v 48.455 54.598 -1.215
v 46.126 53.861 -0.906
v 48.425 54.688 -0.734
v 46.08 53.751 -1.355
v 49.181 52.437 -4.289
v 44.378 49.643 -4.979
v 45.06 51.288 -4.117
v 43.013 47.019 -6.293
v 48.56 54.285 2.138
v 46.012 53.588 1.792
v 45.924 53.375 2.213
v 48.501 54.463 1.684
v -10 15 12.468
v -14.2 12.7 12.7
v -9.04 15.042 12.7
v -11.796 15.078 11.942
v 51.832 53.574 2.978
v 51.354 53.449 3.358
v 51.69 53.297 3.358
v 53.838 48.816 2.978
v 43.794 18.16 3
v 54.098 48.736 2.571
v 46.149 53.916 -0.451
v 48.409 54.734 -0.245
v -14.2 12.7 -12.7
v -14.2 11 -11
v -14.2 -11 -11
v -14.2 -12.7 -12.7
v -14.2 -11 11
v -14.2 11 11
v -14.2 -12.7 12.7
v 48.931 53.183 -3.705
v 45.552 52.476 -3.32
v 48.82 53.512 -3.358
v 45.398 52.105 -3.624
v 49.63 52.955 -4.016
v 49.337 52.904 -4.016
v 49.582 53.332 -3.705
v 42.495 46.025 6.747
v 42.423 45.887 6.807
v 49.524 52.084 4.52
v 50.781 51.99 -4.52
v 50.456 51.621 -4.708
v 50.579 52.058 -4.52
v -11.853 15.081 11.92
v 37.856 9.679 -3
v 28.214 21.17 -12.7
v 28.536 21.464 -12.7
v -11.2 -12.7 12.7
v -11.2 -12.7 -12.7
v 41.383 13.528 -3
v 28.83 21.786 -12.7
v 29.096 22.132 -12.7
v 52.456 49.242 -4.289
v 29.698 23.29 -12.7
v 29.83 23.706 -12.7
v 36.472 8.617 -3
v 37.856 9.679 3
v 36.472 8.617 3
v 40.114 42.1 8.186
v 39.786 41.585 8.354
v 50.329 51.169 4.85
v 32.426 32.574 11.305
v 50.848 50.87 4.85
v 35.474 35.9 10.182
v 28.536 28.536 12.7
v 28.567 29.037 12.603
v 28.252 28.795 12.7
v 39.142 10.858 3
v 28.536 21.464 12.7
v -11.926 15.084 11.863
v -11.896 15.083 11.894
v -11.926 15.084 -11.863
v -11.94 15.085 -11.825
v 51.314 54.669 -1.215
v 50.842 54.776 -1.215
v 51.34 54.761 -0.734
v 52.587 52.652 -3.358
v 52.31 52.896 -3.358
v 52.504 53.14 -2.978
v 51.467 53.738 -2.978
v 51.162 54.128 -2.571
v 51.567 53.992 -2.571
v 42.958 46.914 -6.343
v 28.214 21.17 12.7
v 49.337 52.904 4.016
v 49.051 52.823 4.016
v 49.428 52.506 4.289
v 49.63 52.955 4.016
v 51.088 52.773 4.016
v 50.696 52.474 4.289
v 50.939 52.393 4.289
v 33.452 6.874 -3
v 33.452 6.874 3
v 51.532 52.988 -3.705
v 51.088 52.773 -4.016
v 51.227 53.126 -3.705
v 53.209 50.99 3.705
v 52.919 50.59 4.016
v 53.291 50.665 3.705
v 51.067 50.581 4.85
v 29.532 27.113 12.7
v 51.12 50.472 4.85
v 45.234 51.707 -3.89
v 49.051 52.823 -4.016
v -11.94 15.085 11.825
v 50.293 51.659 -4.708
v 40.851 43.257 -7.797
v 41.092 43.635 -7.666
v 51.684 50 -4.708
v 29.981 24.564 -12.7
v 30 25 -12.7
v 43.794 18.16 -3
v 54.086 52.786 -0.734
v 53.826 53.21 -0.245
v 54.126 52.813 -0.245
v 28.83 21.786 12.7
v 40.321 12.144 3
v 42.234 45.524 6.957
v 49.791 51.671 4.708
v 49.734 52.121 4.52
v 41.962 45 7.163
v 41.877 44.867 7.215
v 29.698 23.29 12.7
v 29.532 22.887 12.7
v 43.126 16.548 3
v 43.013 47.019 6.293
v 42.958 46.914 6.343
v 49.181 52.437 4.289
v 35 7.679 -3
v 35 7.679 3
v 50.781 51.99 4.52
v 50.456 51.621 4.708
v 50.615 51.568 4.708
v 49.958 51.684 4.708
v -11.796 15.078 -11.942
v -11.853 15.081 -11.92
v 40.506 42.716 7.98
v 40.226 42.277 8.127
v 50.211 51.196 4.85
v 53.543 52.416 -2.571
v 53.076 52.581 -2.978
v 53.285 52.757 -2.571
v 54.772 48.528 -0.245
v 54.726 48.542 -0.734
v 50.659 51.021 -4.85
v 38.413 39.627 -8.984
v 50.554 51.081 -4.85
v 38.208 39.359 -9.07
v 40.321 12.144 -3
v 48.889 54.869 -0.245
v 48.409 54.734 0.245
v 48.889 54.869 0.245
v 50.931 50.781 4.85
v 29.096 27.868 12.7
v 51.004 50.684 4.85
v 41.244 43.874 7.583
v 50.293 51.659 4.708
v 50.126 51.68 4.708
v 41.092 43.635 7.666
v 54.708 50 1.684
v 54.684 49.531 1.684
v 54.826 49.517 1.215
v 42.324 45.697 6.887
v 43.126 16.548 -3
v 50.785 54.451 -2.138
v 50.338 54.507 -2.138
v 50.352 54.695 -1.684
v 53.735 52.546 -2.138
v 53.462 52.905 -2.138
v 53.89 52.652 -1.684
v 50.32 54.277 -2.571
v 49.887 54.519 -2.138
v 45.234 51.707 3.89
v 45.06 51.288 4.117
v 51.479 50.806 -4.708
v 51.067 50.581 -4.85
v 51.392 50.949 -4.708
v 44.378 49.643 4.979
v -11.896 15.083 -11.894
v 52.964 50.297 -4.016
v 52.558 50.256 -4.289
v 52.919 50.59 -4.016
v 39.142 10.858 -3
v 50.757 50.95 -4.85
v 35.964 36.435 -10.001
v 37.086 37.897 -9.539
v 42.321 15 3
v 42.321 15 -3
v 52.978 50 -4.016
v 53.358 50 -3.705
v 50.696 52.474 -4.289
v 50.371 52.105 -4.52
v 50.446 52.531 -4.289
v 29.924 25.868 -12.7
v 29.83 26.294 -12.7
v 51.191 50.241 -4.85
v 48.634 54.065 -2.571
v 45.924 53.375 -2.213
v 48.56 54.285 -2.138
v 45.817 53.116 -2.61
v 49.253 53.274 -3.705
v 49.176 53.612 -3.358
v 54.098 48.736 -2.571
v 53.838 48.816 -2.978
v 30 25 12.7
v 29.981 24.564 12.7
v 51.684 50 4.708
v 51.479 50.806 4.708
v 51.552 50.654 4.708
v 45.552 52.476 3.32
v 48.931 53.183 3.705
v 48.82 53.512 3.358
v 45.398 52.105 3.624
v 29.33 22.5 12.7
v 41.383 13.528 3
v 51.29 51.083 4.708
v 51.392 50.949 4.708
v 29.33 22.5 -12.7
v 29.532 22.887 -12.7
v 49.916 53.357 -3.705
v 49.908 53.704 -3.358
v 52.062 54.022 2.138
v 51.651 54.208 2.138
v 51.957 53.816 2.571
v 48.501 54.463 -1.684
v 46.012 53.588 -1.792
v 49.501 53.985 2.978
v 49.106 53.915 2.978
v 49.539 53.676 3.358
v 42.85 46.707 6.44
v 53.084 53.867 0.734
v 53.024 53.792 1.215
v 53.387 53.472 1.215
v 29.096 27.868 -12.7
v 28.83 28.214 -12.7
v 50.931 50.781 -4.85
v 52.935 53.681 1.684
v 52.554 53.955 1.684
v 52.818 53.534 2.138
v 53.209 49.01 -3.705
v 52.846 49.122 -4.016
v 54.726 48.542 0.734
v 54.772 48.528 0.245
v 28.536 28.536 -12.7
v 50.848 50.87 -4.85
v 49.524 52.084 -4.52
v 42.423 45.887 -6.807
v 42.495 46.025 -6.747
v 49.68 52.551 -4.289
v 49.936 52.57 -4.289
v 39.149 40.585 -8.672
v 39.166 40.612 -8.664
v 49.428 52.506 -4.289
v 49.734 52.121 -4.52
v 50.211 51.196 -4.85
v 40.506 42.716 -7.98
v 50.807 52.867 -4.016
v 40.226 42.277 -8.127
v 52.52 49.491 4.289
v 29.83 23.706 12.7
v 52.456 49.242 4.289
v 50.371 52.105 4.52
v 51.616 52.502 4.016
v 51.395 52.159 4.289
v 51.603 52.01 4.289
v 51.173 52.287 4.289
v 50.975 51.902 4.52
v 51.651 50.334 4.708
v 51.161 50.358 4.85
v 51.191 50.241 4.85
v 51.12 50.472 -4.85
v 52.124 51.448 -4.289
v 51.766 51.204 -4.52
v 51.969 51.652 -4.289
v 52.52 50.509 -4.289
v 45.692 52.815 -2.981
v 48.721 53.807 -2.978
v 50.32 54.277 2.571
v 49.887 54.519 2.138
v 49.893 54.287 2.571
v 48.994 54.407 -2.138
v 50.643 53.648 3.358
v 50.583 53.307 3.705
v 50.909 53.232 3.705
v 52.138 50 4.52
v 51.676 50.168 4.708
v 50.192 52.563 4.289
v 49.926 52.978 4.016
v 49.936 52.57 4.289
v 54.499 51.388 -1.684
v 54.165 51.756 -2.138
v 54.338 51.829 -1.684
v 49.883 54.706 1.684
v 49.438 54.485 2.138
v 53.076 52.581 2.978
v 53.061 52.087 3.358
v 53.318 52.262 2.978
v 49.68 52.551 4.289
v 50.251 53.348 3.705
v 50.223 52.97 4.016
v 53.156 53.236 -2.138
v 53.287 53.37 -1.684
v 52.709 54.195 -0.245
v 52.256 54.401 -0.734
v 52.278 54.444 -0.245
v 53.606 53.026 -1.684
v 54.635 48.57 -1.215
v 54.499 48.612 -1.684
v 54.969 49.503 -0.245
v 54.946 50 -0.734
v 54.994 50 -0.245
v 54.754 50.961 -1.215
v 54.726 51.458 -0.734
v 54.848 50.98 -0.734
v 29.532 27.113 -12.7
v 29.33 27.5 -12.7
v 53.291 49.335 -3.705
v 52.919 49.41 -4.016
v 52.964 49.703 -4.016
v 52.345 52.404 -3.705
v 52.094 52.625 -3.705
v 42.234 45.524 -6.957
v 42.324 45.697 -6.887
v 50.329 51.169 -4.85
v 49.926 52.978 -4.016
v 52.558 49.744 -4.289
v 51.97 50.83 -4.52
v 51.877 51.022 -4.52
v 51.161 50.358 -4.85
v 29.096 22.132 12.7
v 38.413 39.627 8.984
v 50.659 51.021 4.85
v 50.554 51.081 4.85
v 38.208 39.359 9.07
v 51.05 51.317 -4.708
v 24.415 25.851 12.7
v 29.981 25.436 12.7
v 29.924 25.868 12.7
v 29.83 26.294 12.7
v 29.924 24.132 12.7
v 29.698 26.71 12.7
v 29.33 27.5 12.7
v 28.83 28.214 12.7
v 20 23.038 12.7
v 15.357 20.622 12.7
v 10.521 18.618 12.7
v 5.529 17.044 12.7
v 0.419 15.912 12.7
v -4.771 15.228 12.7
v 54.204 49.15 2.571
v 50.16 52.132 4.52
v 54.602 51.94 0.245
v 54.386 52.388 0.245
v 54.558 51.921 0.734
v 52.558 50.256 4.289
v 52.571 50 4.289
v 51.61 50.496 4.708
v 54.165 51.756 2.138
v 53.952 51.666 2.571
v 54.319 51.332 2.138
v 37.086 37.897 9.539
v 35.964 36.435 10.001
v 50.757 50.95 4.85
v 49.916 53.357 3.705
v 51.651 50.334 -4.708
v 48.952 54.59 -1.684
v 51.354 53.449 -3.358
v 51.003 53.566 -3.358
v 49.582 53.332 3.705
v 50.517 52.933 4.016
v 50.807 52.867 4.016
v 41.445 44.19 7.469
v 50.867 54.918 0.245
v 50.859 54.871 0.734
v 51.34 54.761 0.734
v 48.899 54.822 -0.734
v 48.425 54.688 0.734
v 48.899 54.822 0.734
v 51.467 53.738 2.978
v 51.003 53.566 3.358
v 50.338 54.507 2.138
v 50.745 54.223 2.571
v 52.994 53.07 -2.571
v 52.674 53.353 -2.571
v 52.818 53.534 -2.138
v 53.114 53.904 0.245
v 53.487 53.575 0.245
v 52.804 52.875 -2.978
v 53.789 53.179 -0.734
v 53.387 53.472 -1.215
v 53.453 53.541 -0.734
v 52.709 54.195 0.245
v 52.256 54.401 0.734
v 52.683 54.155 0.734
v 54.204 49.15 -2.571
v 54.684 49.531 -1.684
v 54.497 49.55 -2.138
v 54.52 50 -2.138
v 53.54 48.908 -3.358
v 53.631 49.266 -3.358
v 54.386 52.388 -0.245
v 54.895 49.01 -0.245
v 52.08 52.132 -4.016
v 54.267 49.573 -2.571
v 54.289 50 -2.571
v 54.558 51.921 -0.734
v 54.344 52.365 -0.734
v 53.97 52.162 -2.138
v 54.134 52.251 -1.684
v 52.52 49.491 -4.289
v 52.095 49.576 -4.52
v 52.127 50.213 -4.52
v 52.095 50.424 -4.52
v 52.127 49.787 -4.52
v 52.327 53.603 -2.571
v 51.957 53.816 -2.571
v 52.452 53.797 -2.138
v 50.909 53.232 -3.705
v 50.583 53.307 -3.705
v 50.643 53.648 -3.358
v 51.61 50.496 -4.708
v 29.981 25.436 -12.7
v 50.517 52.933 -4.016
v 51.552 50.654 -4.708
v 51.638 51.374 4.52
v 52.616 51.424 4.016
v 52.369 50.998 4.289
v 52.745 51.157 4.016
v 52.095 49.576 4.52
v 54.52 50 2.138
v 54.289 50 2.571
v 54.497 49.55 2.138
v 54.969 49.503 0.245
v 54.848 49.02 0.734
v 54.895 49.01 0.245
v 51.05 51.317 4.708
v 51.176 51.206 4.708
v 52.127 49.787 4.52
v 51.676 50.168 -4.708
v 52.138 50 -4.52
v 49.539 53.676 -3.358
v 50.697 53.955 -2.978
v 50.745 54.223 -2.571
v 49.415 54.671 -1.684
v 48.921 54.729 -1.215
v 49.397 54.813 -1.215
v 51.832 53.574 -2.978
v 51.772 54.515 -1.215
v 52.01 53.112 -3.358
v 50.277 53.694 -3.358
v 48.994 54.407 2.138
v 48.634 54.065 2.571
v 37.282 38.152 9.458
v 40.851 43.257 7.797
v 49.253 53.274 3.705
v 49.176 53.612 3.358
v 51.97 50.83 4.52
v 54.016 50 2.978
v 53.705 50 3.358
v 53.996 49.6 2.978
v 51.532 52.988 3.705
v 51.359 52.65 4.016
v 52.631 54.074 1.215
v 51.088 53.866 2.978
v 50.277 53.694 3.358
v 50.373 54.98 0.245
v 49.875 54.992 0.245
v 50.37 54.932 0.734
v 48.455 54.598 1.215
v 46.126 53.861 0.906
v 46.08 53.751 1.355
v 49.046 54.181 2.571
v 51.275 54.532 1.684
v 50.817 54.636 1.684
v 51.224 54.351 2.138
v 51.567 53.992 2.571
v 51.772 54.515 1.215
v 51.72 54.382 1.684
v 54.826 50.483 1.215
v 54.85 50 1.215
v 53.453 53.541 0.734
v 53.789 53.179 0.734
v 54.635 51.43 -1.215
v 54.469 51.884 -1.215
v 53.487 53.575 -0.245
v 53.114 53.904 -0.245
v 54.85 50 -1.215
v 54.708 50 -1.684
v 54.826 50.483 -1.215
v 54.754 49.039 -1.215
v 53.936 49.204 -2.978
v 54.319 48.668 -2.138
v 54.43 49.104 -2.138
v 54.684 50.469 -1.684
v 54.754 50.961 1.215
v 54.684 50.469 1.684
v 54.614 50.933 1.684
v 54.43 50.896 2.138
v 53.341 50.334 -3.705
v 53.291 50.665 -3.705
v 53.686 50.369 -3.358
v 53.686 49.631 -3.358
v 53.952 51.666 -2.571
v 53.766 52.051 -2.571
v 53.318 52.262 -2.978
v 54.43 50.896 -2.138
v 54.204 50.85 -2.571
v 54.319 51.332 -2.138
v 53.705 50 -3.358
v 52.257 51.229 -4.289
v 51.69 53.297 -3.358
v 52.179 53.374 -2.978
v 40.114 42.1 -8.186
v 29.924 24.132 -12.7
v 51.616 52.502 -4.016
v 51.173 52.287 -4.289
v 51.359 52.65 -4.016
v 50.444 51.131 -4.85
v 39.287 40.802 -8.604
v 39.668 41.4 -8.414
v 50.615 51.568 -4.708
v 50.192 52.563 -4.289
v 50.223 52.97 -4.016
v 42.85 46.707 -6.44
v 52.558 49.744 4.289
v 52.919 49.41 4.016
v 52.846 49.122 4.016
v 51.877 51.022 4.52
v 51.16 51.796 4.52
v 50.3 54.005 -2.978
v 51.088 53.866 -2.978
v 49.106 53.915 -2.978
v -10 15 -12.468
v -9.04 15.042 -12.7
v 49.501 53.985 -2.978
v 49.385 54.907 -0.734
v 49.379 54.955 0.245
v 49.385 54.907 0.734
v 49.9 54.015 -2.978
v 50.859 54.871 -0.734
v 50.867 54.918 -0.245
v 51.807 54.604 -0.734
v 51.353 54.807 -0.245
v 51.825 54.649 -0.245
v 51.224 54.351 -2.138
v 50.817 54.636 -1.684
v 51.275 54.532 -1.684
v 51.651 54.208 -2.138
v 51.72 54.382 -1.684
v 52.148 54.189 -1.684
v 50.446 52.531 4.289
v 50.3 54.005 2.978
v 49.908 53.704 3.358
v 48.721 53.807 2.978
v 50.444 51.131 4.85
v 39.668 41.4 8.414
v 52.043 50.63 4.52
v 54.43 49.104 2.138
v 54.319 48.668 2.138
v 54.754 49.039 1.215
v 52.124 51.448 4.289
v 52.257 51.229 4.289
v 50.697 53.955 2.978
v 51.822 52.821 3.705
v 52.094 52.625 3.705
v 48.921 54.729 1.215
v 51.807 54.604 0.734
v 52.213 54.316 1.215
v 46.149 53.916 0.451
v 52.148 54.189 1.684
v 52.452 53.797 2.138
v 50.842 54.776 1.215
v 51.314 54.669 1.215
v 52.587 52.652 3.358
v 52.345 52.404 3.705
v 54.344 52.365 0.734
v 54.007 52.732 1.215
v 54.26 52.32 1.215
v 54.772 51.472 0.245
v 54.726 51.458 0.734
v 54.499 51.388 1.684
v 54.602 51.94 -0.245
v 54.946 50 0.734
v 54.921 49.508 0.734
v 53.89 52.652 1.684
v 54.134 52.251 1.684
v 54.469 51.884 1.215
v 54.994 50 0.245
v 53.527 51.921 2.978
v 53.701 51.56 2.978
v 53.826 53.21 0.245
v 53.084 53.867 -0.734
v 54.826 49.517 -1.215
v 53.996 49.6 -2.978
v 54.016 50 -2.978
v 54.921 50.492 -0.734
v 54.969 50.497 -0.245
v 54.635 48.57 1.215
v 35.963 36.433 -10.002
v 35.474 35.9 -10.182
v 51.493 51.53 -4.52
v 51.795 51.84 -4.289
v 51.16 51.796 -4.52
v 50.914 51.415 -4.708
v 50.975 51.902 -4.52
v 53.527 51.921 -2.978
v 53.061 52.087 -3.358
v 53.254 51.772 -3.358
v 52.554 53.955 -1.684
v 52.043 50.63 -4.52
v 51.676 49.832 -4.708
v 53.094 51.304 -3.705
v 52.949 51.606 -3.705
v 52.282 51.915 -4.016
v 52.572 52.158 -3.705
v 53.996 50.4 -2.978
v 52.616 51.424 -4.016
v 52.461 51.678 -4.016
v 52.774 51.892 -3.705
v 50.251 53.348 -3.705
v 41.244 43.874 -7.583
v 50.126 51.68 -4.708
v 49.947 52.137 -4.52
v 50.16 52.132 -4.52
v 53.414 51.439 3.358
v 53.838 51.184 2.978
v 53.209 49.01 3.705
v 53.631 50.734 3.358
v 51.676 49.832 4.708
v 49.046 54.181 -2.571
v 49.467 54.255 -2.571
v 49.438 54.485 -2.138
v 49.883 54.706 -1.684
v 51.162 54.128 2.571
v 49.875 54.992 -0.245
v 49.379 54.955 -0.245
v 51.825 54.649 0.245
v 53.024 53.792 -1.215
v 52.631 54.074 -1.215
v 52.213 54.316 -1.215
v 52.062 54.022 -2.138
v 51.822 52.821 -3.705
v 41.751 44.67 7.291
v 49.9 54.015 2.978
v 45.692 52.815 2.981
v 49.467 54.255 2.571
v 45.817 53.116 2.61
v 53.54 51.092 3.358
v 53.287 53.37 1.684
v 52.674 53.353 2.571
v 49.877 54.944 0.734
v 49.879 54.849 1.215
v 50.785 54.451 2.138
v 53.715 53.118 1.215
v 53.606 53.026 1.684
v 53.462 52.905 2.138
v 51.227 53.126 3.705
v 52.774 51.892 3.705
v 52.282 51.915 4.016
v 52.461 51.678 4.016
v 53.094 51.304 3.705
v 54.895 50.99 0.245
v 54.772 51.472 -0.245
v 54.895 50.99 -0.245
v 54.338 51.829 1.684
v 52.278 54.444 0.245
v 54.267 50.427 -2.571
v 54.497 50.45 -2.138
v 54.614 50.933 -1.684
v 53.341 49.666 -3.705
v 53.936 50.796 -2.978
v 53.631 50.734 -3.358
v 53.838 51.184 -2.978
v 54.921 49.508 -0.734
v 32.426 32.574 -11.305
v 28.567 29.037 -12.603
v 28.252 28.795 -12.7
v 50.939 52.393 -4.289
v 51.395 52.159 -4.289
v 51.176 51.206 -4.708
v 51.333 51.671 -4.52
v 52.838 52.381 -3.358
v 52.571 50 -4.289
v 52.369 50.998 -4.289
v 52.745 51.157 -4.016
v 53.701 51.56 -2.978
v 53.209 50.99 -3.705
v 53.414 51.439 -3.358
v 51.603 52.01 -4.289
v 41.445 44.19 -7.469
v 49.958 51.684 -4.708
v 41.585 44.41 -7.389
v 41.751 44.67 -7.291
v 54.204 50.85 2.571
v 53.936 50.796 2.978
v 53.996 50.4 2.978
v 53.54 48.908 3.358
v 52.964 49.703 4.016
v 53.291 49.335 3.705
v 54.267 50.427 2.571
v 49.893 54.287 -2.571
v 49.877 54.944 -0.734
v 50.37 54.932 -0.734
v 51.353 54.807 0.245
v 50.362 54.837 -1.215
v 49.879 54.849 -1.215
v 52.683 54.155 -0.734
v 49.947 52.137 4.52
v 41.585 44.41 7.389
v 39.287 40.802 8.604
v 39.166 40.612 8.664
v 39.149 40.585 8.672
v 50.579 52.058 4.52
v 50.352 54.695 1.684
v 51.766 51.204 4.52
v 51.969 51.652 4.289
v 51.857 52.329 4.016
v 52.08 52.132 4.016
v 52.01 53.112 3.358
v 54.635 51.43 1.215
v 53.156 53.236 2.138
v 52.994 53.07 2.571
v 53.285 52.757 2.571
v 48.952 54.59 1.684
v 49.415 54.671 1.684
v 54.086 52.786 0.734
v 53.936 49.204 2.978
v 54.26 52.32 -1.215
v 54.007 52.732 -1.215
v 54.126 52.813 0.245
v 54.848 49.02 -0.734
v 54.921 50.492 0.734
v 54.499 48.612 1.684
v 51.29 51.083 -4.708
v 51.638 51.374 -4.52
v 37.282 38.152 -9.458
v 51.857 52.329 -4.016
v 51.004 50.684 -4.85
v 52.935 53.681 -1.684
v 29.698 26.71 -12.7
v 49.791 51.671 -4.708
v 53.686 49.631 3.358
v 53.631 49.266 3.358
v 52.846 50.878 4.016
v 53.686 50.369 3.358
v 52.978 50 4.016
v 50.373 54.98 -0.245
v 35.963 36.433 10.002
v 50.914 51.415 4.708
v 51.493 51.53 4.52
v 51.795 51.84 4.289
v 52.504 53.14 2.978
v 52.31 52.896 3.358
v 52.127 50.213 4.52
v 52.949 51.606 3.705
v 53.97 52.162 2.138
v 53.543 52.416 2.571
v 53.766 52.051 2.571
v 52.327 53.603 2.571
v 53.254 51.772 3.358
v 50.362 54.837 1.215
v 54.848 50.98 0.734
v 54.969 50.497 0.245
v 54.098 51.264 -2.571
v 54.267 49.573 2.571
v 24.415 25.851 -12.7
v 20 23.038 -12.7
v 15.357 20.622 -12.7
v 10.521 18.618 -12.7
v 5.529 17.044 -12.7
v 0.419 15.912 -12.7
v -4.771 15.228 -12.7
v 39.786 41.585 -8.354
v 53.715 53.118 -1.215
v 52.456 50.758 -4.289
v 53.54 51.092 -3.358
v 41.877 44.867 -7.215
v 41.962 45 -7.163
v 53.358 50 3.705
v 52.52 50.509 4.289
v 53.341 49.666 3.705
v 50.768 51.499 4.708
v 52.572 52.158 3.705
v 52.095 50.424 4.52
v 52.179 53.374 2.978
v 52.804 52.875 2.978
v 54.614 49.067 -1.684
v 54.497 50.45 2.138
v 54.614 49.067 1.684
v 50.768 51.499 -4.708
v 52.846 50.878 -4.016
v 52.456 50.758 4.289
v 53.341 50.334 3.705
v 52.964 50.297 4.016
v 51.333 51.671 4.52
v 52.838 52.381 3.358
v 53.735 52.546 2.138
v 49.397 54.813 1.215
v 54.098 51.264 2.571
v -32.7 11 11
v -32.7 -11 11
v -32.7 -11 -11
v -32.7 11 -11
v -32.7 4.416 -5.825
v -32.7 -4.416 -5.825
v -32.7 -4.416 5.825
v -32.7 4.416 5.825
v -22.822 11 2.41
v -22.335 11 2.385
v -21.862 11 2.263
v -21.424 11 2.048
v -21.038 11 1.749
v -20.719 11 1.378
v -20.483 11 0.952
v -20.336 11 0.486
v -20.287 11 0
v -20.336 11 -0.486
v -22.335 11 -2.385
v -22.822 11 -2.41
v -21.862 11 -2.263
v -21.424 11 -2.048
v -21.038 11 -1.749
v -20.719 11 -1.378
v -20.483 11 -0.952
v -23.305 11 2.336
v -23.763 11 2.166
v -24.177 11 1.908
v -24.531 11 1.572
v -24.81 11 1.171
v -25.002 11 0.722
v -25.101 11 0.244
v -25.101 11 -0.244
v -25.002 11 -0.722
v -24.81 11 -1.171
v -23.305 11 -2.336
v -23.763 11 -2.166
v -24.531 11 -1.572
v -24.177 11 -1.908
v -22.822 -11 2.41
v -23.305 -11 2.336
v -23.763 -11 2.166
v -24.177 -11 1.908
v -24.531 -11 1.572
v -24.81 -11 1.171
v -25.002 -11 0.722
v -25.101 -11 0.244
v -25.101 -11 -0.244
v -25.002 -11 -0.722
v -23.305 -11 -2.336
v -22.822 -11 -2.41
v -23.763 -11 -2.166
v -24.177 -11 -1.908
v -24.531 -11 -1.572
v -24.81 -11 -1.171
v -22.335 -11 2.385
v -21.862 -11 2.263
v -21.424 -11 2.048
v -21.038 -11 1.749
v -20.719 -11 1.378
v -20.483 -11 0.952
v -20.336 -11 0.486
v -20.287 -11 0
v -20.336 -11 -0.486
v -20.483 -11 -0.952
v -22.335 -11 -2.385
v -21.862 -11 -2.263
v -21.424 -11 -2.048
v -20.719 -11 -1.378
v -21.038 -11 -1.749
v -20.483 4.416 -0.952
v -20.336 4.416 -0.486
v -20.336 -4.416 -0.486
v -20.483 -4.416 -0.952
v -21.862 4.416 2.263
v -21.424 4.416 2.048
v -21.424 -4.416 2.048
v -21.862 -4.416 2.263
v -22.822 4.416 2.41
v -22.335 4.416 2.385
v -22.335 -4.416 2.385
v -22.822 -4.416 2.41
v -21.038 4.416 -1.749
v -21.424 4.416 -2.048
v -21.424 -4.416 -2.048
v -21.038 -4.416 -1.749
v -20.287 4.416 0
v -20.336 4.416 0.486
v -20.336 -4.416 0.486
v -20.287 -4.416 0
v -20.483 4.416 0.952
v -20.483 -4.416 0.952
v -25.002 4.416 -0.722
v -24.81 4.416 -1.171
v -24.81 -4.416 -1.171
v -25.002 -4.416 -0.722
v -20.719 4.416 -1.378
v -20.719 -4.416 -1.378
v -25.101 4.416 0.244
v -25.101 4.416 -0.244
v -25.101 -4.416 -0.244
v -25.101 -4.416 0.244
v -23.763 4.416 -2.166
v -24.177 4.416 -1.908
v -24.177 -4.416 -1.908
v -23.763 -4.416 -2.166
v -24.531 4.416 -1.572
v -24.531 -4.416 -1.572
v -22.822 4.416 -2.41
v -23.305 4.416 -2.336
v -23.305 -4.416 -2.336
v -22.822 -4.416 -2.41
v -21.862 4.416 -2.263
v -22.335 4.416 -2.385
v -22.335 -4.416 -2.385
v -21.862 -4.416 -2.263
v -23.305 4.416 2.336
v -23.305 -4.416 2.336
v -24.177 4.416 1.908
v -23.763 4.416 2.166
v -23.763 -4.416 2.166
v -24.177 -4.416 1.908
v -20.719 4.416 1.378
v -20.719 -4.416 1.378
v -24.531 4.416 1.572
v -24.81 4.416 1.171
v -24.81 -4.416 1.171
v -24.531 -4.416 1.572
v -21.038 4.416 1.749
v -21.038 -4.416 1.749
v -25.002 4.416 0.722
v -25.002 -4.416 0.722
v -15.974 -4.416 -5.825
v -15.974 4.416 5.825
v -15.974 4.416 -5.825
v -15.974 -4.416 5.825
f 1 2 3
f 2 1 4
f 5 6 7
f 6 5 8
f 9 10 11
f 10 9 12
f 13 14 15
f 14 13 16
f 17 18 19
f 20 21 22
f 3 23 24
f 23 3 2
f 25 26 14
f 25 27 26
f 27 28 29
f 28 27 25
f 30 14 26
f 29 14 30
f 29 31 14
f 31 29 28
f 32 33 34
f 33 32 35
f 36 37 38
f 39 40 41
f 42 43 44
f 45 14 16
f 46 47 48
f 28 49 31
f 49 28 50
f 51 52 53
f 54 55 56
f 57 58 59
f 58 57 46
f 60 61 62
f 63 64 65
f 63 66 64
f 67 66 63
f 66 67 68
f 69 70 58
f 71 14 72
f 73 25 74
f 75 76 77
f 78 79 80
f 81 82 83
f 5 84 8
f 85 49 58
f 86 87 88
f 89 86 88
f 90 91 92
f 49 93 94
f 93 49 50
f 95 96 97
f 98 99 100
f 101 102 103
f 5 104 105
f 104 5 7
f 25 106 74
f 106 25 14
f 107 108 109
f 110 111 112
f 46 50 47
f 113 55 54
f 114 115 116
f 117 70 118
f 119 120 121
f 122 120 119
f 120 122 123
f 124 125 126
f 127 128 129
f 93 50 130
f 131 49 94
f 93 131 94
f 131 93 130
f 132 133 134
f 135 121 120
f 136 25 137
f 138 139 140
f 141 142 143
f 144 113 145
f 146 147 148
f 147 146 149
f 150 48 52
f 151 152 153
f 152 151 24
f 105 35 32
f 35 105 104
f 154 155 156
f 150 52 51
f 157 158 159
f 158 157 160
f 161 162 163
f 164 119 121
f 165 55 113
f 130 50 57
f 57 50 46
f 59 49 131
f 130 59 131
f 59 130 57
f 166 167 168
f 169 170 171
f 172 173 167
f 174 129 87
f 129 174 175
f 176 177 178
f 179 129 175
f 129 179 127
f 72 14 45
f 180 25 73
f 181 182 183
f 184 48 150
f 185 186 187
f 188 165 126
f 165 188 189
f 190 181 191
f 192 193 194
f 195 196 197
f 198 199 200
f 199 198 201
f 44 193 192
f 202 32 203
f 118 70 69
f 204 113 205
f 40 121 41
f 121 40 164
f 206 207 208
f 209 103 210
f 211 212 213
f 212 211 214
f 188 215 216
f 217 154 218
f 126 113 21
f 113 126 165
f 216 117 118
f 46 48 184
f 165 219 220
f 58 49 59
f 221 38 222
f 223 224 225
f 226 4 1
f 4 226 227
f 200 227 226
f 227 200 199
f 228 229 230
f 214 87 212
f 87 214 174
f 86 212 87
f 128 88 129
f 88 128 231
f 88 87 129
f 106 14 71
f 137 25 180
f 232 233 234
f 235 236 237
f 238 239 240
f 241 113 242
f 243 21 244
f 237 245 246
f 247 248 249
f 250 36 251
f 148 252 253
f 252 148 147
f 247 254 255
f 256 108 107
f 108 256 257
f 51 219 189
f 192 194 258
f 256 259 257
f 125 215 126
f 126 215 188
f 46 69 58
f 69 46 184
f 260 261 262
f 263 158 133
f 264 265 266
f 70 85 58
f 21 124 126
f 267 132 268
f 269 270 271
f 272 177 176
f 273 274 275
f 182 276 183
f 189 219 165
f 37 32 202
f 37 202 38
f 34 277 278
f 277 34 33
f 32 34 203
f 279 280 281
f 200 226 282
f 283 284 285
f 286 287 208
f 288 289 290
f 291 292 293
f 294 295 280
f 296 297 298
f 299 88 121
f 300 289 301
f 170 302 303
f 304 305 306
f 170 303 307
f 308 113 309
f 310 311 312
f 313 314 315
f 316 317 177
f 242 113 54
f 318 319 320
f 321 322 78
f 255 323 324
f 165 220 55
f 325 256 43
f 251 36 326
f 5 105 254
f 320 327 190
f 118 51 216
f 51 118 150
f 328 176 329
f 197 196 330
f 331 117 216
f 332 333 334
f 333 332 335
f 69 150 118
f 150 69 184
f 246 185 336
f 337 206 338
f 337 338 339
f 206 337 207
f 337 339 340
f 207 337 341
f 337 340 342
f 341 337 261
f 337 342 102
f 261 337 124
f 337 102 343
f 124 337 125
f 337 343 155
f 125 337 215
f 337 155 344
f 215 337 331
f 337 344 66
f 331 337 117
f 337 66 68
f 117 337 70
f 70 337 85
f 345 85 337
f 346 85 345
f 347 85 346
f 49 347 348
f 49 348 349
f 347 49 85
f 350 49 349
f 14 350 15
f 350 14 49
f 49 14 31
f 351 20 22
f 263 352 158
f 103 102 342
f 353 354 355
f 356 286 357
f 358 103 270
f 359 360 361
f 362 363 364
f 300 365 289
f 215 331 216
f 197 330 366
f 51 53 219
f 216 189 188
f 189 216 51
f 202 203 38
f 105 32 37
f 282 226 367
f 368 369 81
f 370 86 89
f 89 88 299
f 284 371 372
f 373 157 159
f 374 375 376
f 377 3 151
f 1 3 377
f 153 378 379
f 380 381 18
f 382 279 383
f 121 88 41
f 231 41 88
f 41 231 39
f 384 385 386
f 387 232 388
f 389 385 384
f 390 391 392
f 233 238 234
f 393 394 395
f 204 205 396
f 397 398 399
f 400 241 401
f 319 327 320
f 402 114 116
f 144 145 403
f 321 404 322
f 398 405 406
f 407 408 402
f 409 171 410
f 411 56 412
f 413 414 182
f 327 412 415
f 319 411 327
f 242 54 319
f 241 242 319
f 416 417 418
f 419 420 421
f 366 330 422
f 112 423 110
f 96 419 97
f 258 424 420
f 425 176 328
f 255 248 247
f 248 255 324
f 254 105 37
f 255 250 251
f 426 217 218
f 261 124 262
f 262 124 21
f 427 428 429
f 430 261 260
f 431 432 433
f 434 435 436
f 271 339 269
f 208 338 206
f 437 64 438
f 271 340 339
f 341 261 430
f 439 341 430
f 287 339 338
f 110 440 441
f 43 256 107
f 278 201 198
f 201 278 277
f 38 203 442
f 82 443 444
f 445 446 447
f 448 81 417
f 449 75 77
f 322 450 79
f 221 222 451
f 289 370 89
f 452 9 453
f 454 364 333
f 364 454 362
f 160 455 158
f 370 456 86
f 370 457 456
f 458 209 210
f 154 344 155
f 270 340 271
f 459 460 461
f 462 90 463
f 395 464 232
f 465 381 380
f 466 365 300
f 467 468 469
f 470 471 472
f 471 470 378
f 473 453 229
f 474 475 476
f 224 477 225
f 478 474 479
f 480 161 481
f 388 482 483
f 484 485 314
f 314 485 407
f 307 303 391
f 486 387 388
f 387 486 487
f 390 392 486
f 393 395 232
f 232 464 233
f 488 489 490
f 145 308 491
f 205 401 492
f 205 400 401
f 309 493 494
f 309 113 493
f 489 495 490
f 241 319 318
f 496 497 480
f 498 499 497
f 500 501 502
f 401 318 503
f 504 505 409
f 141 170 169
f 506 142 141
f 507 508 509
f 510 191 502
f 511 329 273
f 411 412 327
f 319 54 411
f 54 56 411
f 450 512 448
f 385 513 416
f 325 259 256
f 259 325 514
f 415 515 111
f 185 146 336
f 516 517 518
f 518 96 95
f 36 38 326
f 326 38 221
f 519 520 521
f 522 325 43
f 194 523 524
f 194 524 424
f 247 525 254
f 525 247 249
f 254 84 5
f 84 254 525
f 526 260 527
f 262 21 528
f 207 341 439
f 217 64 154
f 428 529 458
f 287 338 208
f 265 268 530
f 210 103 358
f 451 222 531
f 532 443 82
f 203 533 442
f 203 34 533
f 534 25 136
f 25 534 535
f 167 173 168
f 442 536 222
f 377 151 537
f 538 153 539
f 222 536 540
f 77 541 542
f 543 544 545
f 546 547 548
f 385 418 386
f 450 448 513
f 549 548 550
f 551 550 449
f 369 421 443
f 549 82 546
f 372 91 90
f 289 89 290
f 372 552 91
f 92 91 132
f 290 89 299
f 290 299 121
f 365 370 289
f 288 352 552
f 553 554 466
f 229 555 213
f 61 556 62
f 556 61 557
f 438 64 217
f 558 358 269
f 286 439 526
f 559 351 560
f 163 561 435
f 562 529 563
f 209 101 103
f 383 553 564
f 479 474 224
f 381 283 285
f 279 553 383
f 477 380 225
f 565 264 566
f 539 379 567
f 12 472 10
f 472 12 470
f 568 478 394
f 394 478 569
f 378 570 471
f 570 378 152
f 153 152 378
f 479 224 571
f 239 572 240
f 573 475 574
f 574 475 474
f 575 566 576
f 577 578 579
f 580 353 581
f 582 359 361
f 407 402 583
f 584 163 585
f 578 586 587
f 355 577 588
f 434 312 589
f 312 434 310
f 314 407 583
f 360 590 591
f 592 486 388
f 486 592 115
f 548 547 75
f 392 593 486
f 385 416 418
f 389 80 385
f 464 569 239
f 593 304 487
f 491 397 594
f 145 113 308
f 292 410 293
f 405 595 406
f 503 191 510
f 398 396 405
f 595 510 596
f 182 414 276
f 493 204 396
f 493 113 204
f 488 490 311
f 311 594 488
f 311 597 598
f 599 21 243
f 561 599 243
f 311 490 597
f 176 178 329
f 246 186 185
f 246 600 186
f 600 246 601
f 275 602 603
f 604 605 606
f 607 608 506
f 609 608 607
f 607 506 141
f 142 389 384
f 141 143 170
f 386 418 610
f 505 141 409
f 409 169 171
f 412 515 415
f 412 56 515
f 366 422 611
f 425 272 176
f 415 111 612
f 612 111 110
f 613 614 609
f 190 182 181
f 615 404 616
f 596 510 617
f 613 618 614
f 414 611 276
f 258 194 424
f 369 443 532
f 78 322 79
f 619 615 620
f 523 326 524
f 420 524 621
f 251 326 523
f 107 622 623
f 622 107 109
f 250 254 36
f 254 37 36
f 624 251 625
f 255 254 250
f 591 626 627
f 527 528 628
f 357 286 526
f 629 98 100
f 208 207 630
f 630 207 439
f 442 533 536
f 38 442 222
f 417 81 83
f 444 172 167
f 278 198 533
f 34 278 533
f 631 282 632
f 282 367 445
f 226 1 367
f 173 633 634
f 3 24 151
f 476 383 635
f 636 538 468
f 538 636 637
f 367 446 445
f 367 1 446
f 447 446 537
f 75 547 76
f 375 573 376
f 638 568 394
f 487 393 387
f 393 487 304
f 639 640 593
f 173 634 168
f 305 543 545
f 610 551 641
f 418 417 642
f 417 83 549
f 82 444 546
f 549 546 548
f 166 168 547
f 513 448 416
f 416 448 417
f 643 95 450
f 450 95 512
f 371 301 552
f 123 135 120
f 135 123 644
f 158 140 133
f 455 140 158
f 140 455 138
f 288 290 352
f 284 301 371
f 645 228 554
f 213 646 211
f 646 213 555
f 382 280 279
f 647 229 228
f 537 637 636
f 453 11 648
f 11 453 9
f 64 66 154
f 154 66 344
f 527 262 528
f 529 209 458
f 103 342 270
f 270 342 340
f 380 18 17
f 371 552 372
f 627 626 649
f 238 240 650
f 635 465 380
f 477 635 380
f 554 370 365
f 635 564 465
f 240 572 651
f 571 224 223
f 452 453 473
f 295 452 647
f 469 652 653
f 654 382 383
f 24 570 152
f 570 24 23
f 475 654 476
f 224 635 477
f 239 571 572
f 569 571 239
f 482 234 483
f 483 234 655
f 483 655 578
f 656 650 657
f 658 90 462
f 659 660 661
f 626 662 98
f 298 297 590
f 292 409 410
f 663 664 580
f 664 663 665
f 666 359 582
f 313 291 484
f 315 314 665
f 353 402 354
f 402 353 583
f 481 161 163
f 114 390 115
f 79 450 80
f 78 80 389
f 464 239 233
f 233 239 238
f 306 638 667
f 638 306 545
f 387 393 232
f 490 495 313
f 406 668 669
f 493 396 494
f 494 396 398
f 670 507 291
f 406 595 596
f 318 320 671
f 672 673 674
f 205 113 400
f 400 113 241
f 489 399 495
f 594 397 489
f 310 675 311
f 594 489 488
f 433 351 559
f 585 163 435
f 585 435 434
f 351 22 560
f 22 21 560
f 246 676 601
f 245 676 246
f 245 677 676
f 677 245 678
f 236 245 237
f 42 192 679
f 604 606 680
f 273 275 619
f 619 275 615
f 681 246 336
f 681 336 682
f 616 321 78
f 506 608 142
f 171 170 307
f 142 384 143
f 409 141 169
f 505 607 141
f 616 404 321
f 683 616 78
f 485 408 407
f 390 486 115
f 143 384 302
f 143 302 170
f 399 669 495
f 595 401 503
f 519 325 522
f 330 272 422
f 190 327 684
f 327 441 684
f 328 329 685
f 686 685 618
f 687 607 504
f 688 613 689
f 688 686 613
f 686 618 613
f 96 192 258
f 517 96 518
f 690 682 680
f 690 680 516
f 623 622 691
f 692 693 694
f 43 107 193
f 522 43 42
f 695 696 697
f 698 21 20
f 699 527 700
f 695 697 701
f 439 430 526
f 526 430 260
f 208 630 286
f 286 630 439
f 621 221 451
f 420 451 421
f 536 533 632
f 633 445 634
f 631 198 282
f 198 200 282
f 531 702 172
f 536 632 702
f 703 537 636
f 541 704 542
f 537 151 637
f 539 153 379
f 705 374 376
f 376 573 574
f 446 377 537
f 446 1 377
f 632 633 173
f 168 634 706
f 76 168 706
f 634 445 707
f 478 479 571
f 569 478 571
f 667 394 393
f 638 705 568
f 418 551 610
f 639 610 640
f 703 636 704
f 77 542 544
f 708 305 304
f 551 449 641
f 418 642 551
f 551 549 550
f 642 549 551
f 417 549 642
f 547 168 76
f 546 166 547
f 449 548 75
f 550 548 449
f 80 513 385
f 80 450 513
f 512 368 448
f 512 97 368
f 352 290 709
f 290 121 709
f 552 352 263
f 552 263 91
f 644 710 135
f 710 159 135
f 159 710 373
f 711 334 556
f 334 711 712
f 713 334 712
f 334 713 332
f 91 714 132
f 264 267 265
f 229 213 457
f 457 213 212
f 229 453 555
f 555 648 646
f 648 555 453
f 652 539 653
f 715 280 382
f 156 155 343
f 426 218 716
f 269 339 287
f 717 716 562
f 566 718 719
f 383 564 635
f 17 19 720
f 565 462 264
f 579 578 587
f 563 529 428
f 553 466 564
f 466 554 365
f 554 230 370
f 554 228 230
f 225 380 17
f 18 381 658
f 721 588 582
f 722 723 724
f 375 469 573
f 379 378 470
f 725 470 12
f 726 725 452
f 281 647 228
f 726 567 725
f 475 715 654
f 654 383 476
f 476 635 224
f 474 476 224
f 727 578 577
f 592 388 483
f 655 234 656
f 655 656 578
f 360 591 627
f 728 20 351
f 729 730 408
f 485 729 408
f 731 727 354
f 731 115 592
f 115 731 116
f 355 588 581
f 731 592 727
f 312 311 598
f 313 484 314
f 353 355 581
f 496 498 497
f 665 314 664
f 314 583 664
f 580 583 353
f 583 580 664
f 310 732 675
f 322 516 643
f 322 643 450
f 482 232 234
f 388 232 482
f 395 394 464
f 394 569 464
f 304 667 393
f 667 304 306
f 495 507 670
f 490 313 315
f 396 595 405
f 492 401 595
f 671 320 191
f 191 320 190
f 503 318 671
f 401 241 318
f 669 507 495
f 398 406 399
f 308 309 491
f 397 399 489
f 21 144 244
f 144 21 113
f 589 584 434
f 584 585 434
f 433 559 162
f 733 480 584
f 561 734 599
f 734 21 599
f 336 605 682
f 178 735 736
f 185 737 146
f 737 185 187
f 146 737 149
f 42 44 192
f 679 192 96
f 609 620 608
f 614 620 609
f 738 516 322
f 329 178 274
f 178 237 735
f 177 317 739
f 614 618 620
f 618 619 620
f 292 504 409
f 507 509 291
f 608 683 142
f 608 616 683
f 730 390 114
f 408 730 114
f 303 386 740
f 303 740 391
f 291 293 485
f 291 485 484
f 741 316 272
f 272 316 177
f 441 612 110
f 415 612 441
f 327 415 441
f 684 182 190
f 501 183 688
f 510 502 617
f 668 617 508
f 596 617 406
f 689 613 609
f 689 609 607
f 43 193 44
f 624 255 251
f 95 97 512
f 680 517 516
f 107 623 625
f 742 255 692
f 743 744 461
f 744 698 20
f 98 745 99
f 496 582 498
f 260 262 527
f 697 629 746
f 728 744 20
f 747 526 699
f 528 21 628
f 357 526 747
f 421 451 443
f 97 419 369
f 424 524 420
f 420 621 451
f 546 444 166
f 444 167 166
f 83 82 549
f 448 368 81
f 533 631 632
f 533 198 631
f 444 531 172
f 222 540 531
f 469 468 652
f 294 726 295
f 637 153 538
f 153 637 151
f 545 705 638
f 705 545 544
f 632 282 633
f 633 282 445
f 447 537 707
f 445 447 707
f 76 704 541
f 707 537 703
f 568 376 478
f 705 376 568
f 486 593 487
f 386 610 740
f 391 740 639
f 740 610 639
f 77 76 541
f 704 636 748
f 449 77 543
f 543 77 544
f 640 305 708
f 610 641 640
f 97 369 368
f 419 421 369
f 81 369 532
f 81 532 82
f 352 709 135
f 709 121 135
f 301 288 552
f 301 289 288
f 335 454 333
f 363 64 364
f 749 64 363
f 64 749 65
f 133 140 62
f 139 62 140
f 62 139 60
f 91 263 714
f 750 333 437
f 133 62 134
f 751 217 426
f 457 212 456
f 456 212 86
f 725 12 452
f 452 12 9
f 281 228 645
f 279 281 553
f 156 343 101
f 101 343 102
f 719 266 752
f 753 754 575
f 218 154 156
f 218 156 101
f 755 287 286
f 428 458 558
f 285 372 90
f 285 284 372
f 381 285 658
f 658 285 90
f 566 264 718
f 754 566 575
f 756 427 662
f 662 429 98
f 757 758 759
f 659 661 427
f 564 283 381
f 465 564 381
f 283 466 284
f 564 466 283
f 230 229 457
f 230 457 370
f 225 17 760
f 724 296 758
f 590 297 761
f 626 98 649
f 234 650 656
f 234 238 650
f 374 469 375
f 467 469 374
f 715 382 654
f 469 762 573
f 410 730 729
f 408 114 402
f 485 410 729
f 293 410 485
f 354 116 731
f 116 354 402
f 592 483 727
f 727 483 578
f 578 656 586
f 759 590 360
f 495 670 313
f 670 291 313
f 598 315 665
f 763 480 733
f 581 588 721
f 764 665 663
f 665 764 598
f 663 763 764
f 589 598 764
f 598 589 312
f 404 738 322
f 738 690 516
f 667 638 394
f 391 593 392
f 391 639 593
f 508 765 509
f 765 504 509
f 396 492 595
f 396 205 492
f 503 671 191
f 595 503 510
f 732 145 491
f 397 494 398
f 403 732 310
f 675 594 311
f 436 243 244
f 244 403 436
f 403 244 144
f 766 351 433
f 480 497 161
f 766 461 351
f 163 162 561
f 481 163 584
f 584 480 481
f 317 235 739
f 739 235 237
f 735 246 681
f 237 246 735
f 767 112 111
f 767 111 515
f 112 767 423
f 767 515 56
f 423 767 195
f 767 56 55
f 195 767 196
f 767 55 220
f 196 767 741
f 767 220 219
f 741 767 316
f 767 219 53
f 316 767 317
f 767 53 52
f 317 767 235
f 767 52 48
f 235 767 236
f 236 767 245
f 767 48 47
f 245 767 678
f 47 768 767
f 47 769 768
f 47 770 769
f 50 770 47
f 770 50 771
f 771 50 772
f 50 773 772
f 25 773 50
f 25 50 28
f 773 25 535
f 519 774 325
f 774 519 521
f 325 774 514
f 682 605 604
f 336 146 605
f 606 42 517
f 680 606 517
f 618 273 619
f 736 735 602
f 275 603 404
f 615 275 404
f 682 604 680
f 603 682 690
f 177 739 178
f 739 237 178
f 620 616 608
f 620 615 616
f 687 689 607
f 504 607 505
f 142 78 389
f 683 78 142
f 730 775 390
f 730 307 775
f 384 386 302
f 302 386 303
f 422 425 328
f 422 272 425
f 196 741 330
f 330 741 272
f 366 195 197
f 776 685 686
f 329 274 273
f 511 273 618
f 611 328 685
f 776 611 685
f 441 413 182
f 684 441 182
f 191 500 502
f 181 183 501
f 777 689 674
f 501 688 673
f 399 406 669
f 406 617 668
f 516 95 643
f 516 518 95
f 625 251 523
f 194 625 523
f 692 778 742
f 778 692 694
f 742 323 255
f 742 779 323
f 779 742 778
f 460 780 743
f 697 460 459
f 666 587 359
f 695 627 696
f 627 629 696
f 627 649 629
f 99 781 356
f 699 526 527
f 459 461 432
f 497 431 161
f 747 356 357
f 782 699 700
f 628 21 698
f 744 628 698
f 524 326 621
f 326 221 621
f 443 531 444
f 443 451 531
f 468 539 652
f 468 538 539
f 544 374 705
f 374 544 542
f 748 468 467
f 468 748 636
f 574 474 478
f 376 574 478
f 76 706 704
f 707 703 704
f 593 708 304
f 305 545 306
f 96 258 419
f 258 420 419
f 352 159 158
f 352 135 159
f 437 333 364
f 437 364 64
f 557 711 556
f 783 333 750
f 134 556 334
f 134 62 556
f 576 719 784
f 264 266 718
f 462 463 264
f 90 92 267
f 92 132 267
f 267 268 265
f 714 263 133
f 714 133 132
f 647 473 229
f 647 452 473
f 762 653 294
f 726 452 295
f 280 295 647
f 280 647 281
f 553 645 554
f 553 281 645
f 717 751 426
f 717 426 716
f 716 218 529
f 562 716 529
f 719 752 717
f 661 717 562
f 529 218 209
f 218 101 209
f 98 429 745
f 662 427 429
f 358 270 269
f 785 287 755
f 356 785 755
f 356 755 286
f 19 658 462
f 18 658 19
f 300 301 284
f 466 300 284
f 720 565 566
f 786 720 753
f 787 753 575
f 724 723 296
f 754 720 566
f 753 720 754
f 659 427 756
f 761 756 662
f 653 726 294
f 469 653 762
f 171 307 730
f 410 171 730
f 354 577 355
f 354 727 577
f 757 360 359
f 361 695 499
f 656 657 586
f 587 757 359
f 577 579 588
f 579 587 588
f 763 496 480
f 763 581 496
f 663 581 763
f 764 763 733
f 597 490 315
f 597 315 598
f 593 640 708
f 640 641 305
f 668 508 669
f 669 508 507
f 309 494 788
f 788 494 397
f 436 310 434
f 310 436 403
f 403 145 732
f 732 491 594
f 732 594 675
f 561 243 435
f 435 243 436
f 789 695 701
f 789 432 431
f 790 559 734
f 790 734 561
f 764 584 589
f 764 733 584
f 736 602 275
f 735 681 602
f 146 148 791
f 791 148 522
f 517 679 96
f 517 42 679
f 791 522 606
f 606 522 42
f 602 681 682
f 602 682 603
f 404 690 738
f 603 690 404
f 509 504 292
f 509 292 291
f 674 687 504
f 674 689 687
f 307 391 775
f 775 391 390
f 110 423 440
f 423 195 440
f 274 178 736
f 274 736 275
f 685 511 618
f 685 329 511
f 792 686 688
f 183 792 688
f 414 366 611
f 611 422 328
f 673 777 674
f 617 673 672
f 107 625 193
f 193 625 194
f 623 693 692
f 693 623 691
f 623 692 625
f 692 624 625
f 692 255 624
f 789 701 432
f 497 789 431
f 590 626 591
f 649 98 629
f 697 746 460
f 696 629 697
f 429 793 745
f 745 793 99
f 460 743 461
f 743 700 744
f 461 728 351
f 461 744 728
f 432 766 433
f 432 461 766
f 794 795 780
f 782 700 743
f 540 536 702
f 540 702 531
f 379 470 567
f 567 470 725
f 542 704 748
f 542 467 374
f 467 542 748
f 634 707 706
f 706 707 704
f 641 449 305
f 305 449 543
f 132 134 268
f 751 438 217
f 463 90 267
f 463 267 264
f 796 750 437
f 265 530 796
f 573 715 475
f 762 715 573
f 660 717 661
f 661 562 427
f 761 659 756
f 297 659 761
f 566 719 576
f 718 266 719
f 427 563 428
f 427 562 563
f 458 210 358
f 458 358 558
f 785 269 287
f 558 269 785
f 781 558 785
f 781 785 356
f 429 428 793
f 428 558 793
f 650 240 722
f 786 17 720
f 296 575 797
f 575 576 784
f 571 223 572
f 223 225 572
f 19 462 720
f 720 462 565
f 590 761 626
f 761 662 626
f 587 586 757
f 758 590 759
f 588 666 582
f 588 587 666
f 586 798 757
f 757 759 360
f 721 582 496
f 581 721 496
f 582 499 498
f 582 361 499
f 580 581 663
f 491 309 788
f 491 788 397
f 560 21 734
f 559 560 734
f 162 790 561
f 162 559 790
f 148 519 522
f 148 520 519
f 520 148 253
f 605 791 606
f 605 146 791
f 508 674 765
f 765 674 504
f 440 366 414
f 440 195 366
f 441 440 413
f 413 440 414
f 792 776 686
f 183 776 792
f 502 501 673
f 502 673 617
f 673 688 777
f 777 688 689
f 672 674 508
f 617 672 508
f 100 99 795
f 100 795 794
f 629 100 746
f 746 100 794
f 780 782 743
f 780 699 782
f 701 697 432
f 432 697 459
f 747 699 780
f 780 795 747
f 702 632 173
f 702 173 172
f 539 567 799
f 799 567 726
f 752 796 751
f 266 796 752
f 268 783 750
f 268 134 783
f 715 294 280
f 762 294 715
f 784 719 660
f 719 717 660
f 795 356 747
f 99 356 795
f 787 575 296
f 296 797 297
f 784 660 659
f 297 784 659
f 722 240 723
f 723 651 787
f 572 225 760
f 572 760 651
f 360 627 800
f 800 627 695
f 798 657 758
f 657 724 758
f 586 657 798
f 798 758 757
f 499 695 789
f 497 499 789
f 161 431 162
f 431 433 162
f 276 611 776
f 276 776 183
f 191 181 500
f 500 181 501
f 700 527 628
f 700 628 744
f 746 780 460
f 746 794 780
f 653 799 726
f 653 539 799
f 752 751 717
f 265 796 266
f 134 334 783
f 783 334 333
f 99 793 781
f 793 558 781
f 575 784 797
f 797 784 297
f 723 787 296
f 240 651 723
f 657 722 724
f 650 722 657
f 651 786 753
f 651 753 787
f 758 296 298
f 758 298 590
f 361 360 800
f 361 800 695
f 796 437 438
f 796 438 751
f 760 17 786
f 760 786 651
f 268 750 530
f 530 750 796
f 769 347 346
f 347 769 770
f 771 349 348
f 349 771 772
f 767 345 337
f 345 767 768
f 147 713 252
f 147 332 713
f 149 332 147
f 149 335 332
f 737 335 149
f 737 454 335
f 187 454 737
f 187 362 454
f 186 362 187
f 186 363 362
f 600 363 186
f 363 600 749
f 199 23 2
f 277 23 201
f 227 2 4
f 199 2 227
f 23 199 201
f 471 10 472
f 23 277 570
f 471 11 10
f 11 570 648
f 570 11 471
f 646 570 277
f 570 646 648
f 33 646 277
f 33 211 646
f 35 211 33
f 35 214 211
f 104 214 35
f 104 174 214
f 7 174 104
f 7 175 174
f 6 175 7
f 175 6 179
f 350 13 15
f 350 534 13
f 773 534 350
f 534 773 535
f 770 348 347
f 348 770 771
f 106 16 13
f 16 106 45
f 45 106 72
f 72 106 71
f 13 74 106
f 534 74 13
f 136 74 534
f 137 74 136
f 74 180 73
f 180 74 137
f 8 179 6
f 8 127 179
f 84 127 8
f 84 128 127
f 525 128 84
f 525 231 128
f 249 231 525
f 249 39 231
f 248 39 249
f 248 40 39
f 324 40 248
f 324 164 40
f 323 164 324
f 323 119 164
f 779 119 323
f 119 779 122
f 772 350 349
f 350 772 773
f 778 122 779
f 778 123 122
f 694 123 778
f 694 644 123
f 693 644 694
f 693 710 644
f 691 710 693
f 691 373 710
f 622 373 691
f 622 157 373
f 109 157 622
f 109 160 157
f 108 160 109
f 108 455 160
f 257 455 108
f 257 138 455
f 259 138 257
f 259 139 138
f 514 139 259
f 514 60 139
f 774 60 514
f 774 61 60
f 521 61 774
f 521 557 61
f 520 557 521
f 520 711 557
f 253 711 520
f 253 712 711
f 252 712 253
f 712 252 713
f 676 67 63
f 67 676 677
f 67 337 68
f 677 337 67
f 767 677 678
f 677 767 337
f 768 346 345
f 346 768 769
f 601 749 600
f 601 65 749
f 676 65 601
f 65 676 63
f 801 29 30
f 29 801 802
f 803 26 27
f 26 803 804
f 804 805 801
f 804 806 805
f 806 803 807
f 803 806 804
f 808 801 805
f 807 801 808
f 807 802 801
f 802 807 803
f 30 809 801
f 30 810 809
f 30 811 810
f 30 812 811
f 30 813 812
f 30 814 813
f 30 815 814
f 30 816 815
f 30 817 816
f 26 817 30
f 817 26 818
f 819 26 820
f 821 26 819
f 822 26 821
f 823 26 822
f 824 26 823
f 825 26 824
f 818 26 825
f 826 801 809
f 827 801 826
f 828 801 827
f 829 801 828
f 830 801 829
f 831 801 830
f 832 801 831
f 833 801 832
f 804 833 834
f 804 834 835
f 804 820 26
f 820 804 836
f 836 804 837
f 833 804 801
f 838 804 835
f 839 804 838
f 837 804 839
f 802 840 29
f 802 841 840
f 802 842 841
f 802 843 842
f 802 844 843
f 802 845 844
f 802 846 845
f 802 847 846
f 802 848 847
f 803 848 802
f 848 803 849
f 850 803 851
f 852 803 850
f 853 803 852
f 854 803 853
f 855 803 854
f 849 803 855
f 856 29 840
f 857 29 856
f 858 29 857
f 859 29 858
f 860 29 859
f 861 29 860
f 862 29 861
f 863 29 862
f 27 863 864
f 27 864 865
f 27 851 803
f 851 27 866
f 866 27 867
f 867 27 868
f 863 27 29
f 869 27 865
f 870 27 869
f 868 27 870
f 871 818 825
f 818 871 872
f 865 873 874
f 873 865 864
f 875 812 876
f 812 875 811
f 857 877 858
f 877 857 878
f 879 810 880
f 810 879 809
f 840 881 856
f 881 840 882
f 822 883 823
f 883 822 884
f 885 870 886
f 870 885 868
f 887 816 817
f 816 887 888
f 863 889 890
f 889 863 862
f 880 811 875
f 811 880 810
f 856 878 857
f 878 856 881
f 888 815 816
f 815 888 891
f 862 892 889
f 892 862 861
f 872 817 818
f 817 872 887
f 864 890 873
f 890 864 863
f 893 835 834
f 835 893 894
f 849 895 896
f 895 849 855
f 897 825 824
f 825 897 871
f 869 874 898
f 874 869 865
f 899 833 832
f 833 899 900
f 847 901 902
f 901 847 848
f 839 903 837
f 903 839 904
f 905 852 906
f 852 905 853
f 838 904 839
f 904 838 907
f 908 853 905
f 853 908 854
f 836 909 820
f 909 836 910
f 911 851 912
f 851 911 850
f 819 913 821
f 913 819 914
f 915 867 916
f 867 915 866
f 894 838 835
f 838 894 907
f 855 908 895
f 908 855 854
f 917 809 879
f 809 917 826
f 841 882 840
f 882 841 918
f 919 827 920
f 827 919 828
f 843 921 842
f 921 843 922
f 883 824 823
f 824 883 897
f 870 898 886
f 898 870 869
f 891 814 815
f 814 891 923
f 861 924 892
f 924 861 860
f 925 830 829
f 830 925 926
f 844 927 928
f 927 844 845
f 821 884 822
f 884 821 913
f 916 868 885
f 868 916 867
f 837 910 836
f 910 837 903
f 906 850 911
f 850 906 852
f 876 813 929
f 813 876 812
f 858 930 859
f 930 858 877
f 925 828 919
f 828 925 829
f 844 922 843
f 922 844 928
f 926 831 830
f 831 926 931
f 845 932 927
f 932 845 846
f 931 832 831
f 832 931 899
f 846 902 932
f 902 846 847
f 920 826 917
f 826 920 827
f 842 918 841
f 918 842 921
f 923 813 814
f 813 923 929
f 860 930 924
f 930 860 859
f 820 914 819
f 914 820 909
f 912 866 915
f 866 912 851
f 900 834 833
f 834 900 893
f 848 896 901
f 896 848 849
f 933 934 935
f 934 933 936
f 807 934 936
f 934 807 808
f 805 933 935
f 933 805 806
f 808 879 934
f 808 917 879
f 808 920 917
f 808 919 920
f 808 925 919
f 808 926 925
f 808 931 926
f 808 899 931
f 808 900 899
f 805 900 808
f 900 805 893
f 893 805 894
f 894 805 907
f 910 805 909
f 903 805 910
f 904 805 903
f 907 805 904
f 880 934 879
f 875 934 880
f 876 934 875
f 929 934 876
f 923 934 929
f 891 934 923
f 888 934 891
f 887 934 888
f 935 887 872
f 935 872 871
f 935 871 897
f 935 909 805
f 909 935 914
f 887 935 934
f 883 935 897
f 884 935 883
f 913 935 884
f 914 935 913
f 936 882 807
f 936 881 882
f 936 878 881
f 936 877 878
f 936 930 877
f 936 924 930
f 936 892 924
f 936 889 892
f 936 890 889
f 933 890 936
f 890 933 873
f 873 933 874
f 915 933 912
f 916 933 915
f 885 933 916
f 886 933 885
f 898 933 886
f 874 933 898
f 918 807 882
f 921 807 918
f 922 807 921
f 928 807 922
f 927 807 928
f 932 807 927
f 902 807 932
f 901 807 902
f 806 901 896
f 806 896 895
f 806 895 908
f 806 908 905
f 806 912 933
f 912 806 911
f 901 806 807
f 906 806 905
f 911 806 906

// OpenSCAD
$fa=5;
$fs=0.5;

// Leave this much clearance for printer blobs
clearance=0.5;

box=25.4;
inside=22.5-clearance;
epsilon=0.01;

difference() {
hull() {
// Mount base
translate([-box/2,0,0])
    cube(center=true,size=[3,box,box]);

// Slicing prow
for (side=[-1,+1]) {
    scale([1,1,side])
    translate([25,25,3])
    cylinder(d1=40,d2=10,h=box/2-3);
}

// Rounded top leading edge
translate([50,50,0])
    sphere(r=5);
}

// Lighten everything by peeling arc off the back side
translate([-10,75,0])
    cylinder(r=60,h=box+2*epsilon,center=true);

}


// Add mounting stem:
stemlen=20;
translate([-box/2-stemlen/2,0,0])
difference() {
    cube(center=true,size=[stemlen,inside,inside]);

    // Bolt clearance (tapped later)
    rotate([-90,0,0])
        translate([0,0,-box/2])
        cylinder(d=0.190*25.4,h=box);
    
    // Slot for 1/4" nylock
    nut_flats=0.439*25.4+clearance;
    nut_height=0.328*25.4+clearance;
    translate([-stemlen,-nut_height/2,-nut_flats/2])
        cube(size=[stemlen+nut_flats/(2*cos(30)),nut_height,nut_flats]);
}
